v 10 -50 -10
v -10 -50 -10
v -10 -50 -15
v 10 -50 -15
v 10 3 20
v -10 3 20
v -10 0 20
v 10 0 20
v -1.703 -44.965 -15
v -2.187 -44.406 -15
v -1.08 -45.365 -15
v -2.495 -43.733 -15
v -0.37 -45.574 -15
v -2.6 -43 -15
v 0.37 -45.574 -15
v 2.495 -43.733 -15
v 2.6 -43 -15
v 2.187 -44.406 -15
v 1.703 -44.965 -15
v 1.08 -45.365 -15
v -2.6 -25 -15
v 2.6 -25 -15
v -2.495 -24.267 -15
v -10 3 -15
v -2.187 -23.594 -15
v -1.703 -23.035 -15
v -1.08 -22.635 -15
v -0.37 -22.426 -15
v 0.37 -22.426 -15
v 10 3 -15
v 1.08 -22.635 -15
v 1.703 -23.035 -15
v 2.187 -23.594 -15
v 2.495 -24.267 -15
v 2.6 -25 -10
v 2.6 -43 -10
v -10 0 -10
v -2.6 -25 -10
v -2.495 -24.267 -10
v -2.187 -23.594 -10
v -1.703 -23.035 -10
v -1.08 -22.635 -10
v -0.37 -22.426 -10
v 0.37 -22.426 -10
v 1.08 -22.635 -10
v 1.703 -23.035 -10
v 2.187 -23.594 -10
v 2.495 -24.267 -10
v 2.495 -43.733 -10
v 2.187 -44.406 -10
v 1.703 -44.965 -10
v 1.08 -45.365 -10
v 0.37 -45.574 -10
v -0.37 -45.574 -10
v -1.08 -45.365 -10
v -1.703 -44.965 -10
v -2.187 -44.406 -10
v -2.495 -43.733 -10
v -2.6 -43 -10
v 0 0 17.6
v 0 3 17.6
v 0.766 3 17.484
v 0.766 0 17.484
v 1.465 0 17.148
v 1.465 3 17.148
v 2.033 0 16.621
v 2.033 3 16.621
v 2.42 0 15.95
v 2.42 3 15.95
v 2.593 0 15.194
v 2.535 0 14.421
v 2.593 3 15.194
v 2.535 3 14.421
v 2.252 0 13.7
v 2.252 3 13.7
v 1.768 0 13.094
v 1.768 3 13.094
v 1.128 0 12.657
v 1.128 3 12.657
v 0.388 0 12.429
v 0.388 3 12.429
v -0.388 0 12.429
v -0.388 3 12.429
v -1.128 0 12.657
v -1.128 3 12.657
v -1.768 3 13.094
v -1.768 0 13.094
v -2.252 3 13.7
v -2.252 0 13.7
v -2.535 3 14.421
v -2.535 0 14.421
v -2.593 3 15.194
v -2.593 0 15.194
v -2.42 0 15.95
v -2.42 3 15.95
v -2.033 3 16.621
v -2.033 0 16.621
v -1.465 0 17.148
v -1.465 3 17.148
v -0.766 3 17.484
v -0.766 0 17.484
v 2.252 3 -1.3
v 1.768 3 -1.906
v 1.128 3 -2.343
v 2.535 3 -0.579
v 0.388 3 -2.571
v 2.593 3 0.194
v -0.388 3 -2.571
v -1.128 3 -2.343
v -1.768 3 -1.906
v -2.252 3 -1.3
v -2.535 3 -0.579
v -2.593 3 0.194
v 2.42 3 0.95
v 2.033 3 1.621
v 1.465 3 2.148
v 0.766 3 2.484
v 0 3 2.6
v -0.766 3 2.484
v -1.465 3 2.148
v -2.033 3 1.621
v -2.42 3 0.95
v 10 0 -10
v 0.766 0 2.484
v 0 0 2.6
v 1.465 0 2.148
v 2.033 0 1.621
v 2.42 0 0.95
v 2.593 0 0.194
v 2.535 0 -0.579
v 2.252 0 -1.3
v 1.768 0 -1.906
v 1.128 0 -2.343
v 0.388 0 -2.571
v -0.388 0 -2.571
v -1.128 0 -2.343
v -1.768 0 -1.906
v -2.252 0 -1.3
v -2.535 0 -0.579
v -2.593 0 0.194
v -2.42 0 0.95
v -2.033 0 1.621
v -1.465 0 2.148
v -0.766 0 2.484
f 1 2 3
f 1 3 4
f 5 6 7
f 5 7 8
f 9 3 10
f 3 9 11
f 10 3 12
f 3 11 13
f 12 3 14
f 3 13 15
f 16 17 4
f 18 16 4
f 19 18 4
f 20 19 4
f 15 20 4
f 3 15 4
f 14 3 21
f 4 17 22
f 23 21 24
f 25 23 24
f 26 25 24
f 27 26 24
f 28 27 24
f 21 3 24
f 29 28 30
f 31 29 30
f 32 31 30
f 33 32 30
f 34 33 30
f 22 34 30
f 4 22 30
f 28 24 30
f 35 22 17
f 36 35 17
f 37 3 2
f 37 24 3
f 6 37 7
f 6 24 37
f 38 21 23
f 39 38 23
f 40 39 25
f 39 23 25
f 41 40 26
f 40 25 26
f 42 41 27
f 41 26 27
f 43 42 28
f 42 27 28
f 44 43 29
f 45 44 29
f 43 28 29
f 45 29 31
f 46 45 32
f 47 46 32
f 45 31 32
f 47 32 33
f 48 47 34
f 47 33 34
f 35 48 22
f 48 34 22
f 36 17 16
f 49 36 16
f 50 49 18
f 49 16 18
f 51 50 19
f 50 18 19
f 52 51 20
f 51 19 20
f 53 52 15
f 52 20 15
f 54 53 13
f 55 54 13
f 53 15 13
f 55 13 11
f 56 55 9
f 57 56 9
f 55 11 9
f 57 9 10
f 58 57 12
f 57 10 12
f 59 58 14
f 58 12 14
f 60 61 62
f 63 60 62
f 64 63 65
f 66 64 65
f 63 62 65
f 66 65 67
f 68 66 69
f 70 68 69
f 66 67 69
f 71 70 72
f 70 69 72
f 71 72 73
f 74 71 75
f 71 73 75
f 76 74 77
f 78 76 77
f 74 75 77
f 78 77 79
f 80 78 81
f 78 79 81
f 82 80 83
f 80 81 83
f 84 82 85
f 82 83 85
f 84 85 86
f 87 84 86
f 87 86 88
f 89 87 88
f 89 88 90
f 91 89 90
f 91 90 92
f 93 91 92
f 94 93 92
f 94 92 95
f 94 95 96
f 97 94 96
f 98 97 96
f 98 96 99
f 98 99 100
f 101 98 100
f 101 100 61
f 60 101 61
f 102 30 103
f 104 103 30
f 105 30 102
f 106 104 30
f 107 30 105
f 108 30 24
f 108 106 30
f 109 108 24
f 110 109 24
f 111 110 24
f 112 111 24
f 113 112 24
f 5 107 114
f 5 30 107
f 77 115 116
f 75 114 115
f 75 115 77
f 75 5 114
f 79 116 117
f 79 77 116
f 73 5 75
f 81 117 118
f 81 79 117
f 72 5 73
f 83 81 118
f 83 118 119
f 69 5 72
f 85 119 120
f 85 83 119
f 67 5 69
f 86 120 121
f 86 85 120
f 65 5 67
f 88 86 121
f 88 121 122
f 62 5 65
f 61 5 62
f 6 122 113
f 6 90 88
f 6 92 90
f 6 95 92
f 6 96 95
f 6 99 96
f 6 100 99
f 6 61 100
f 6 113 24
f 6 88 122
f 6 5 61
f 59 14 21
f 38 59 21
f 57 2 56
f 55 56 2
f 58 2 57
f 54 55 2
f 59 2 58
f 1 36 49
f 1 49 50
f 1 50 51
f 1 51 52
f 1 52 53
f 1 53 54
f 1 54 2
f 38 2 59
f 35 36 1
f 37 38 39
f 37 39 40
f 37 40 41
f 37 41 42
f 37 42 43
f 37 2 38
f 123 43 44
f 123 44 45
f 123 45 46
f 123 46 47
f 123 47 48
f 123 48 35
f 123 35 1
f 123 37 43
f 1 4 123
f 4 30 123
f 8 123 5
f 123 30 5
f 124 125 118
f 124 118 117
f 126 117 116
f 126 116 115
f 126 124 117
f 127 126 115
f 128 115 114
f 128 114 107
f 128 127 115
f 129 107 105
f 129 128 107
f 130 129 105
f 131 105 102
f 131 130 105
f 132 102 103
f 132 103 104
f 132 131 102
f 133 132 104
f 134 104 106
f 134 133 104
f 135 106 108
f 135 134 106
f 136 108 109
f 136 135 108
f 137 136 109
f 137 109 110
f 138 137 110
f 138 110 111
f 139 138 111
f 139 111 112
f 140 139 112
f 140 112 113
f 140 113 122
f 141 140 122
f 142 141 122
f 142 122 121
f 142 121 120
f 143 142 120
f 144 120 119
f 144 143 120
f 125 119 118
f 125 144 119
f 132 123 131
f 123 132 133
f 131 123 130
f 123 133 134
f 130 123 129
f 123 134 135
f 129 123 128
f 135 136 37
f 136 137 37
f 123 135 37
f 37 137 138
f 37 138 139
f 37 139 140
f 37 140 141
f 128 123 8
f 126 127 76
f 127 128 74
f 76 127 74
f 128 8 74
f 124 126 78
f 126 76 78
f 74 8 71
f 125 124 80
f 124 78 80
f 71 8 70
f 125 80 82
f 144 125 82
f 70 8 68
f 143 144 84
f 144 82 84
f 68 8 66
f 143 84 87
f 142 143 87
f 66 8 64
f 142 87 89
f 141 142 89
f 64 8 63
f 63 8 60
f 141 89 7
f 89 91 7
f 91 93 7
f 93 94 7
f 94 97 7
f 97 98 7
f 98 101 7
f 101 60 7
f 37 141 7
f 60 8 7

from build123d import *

# Parameters (mm, degrees)
SKETCH1_W           = 20
SKETCH1_H           = 20
SKETCH1_R           = 2.6
BOSS_EXTRUDE2_DEPTH = 3
SKETCH2_W           = 20
SKETCH2_H           = 3
BOSS_EXTRUDE3_DEPTH = 10
SKETCH4_R           = 2.6
CUT_EXTRUDE1_DEPTH  = 10
SKETCH6_W           = 20
SKETCH6_H           = 3
BOSS_EXTRUDE5_DEPTH = 5
SKETCH7_W           = 20
SKETCH7_H           = 5
BOSS_EXTRUDE6_DEPTH = 50
CUT_EXTRUDE2_DEPTH  = 5


with BuildPart() as part:
    # Sketch1 → Boss-Extrude2 (new body)
    with BuildSketch(Plane(origin=(0, 0, 0), x_dir=(1, 0, 0), z_dir=(0, 1, 0))):
        Rectangle(SKETCH1_W, SKETCH1_H)
        with Locations(Location((0, 0, 0), (0, 0, 270))):
            Circle(SKETCH1_R, mode=Mode.SUBTRACT)
    extrude(amount=BOSS_EXTRUDE2_DEPTH)

    # Sketch2 → Boss-Extrude3 (add)
    with BuildSketch(Plane.XY.offset(10)):
        with Locations((0, 1.5)):
            Rectangle(SKETCH2_W, SKETCH2_H)
    extrude(amount=BOSS_EXTRUDE3_DEPTH)

    # Sketch4 → Cut-Extrude1 (cut)
    with BuildSketch(Plane(origin=(0, 3, 0), x_dir=(1, 0, 0), z_dir=(0, 1, 0))):
        with Locations(Location((0, -15, 0), (0, 0, 270))):
            Circle(SKETCH4_R)
    extrude(amount=-CUT_EXTRUDE1_DEPTH, mode=Mode.SUBTRACT)

    # Sketch6 → Boss-Extrude5 (add)
    with BuildSketch(Plane(origin=(0, 0, -10), x_dir=(-1, 0, 0), z_dir=(0, 0, -1))):
        with Locations((0, 1.5)):
            Rectangle(SKETCH6_W, SKETCH6_H)
    extrude(amount=BOSS_EXTRUDE5_DEPTH)

    # Sketch7 → Boss-Extrude6 (add)
    with BuildSketch(Plane.XZ):
        with Locations((0, -12.5)):
            Rectangle(SKETCH7_W, SKETCH7_H)
    extrude(amount=BOSS_EXTRUDE6_DEPTH)

    # Sketch8 → Cut-Extrude2 (cut)
    with BuildSketch(Plane(origin=(0, 0, -15), x_dir=(-1, 0, 0), z_dir=(0, 0, -1))):
        with BuildLine():
            Line((-2.6, -25), (-2.6, -43))
            ThreePointArc((-2.6, -43), (0, -45.6), (2.6, -43))
            Line((2.6, -43), (2.6, -25))
            ThreePointArc((2.6, -25), (0, -22.4), (-2.6, -25))
        make_face()
    extrude(amount=-CUT_EXTRUDE2_DEPTH, mode=Mode.SUBTRACT)


solid = part.part
